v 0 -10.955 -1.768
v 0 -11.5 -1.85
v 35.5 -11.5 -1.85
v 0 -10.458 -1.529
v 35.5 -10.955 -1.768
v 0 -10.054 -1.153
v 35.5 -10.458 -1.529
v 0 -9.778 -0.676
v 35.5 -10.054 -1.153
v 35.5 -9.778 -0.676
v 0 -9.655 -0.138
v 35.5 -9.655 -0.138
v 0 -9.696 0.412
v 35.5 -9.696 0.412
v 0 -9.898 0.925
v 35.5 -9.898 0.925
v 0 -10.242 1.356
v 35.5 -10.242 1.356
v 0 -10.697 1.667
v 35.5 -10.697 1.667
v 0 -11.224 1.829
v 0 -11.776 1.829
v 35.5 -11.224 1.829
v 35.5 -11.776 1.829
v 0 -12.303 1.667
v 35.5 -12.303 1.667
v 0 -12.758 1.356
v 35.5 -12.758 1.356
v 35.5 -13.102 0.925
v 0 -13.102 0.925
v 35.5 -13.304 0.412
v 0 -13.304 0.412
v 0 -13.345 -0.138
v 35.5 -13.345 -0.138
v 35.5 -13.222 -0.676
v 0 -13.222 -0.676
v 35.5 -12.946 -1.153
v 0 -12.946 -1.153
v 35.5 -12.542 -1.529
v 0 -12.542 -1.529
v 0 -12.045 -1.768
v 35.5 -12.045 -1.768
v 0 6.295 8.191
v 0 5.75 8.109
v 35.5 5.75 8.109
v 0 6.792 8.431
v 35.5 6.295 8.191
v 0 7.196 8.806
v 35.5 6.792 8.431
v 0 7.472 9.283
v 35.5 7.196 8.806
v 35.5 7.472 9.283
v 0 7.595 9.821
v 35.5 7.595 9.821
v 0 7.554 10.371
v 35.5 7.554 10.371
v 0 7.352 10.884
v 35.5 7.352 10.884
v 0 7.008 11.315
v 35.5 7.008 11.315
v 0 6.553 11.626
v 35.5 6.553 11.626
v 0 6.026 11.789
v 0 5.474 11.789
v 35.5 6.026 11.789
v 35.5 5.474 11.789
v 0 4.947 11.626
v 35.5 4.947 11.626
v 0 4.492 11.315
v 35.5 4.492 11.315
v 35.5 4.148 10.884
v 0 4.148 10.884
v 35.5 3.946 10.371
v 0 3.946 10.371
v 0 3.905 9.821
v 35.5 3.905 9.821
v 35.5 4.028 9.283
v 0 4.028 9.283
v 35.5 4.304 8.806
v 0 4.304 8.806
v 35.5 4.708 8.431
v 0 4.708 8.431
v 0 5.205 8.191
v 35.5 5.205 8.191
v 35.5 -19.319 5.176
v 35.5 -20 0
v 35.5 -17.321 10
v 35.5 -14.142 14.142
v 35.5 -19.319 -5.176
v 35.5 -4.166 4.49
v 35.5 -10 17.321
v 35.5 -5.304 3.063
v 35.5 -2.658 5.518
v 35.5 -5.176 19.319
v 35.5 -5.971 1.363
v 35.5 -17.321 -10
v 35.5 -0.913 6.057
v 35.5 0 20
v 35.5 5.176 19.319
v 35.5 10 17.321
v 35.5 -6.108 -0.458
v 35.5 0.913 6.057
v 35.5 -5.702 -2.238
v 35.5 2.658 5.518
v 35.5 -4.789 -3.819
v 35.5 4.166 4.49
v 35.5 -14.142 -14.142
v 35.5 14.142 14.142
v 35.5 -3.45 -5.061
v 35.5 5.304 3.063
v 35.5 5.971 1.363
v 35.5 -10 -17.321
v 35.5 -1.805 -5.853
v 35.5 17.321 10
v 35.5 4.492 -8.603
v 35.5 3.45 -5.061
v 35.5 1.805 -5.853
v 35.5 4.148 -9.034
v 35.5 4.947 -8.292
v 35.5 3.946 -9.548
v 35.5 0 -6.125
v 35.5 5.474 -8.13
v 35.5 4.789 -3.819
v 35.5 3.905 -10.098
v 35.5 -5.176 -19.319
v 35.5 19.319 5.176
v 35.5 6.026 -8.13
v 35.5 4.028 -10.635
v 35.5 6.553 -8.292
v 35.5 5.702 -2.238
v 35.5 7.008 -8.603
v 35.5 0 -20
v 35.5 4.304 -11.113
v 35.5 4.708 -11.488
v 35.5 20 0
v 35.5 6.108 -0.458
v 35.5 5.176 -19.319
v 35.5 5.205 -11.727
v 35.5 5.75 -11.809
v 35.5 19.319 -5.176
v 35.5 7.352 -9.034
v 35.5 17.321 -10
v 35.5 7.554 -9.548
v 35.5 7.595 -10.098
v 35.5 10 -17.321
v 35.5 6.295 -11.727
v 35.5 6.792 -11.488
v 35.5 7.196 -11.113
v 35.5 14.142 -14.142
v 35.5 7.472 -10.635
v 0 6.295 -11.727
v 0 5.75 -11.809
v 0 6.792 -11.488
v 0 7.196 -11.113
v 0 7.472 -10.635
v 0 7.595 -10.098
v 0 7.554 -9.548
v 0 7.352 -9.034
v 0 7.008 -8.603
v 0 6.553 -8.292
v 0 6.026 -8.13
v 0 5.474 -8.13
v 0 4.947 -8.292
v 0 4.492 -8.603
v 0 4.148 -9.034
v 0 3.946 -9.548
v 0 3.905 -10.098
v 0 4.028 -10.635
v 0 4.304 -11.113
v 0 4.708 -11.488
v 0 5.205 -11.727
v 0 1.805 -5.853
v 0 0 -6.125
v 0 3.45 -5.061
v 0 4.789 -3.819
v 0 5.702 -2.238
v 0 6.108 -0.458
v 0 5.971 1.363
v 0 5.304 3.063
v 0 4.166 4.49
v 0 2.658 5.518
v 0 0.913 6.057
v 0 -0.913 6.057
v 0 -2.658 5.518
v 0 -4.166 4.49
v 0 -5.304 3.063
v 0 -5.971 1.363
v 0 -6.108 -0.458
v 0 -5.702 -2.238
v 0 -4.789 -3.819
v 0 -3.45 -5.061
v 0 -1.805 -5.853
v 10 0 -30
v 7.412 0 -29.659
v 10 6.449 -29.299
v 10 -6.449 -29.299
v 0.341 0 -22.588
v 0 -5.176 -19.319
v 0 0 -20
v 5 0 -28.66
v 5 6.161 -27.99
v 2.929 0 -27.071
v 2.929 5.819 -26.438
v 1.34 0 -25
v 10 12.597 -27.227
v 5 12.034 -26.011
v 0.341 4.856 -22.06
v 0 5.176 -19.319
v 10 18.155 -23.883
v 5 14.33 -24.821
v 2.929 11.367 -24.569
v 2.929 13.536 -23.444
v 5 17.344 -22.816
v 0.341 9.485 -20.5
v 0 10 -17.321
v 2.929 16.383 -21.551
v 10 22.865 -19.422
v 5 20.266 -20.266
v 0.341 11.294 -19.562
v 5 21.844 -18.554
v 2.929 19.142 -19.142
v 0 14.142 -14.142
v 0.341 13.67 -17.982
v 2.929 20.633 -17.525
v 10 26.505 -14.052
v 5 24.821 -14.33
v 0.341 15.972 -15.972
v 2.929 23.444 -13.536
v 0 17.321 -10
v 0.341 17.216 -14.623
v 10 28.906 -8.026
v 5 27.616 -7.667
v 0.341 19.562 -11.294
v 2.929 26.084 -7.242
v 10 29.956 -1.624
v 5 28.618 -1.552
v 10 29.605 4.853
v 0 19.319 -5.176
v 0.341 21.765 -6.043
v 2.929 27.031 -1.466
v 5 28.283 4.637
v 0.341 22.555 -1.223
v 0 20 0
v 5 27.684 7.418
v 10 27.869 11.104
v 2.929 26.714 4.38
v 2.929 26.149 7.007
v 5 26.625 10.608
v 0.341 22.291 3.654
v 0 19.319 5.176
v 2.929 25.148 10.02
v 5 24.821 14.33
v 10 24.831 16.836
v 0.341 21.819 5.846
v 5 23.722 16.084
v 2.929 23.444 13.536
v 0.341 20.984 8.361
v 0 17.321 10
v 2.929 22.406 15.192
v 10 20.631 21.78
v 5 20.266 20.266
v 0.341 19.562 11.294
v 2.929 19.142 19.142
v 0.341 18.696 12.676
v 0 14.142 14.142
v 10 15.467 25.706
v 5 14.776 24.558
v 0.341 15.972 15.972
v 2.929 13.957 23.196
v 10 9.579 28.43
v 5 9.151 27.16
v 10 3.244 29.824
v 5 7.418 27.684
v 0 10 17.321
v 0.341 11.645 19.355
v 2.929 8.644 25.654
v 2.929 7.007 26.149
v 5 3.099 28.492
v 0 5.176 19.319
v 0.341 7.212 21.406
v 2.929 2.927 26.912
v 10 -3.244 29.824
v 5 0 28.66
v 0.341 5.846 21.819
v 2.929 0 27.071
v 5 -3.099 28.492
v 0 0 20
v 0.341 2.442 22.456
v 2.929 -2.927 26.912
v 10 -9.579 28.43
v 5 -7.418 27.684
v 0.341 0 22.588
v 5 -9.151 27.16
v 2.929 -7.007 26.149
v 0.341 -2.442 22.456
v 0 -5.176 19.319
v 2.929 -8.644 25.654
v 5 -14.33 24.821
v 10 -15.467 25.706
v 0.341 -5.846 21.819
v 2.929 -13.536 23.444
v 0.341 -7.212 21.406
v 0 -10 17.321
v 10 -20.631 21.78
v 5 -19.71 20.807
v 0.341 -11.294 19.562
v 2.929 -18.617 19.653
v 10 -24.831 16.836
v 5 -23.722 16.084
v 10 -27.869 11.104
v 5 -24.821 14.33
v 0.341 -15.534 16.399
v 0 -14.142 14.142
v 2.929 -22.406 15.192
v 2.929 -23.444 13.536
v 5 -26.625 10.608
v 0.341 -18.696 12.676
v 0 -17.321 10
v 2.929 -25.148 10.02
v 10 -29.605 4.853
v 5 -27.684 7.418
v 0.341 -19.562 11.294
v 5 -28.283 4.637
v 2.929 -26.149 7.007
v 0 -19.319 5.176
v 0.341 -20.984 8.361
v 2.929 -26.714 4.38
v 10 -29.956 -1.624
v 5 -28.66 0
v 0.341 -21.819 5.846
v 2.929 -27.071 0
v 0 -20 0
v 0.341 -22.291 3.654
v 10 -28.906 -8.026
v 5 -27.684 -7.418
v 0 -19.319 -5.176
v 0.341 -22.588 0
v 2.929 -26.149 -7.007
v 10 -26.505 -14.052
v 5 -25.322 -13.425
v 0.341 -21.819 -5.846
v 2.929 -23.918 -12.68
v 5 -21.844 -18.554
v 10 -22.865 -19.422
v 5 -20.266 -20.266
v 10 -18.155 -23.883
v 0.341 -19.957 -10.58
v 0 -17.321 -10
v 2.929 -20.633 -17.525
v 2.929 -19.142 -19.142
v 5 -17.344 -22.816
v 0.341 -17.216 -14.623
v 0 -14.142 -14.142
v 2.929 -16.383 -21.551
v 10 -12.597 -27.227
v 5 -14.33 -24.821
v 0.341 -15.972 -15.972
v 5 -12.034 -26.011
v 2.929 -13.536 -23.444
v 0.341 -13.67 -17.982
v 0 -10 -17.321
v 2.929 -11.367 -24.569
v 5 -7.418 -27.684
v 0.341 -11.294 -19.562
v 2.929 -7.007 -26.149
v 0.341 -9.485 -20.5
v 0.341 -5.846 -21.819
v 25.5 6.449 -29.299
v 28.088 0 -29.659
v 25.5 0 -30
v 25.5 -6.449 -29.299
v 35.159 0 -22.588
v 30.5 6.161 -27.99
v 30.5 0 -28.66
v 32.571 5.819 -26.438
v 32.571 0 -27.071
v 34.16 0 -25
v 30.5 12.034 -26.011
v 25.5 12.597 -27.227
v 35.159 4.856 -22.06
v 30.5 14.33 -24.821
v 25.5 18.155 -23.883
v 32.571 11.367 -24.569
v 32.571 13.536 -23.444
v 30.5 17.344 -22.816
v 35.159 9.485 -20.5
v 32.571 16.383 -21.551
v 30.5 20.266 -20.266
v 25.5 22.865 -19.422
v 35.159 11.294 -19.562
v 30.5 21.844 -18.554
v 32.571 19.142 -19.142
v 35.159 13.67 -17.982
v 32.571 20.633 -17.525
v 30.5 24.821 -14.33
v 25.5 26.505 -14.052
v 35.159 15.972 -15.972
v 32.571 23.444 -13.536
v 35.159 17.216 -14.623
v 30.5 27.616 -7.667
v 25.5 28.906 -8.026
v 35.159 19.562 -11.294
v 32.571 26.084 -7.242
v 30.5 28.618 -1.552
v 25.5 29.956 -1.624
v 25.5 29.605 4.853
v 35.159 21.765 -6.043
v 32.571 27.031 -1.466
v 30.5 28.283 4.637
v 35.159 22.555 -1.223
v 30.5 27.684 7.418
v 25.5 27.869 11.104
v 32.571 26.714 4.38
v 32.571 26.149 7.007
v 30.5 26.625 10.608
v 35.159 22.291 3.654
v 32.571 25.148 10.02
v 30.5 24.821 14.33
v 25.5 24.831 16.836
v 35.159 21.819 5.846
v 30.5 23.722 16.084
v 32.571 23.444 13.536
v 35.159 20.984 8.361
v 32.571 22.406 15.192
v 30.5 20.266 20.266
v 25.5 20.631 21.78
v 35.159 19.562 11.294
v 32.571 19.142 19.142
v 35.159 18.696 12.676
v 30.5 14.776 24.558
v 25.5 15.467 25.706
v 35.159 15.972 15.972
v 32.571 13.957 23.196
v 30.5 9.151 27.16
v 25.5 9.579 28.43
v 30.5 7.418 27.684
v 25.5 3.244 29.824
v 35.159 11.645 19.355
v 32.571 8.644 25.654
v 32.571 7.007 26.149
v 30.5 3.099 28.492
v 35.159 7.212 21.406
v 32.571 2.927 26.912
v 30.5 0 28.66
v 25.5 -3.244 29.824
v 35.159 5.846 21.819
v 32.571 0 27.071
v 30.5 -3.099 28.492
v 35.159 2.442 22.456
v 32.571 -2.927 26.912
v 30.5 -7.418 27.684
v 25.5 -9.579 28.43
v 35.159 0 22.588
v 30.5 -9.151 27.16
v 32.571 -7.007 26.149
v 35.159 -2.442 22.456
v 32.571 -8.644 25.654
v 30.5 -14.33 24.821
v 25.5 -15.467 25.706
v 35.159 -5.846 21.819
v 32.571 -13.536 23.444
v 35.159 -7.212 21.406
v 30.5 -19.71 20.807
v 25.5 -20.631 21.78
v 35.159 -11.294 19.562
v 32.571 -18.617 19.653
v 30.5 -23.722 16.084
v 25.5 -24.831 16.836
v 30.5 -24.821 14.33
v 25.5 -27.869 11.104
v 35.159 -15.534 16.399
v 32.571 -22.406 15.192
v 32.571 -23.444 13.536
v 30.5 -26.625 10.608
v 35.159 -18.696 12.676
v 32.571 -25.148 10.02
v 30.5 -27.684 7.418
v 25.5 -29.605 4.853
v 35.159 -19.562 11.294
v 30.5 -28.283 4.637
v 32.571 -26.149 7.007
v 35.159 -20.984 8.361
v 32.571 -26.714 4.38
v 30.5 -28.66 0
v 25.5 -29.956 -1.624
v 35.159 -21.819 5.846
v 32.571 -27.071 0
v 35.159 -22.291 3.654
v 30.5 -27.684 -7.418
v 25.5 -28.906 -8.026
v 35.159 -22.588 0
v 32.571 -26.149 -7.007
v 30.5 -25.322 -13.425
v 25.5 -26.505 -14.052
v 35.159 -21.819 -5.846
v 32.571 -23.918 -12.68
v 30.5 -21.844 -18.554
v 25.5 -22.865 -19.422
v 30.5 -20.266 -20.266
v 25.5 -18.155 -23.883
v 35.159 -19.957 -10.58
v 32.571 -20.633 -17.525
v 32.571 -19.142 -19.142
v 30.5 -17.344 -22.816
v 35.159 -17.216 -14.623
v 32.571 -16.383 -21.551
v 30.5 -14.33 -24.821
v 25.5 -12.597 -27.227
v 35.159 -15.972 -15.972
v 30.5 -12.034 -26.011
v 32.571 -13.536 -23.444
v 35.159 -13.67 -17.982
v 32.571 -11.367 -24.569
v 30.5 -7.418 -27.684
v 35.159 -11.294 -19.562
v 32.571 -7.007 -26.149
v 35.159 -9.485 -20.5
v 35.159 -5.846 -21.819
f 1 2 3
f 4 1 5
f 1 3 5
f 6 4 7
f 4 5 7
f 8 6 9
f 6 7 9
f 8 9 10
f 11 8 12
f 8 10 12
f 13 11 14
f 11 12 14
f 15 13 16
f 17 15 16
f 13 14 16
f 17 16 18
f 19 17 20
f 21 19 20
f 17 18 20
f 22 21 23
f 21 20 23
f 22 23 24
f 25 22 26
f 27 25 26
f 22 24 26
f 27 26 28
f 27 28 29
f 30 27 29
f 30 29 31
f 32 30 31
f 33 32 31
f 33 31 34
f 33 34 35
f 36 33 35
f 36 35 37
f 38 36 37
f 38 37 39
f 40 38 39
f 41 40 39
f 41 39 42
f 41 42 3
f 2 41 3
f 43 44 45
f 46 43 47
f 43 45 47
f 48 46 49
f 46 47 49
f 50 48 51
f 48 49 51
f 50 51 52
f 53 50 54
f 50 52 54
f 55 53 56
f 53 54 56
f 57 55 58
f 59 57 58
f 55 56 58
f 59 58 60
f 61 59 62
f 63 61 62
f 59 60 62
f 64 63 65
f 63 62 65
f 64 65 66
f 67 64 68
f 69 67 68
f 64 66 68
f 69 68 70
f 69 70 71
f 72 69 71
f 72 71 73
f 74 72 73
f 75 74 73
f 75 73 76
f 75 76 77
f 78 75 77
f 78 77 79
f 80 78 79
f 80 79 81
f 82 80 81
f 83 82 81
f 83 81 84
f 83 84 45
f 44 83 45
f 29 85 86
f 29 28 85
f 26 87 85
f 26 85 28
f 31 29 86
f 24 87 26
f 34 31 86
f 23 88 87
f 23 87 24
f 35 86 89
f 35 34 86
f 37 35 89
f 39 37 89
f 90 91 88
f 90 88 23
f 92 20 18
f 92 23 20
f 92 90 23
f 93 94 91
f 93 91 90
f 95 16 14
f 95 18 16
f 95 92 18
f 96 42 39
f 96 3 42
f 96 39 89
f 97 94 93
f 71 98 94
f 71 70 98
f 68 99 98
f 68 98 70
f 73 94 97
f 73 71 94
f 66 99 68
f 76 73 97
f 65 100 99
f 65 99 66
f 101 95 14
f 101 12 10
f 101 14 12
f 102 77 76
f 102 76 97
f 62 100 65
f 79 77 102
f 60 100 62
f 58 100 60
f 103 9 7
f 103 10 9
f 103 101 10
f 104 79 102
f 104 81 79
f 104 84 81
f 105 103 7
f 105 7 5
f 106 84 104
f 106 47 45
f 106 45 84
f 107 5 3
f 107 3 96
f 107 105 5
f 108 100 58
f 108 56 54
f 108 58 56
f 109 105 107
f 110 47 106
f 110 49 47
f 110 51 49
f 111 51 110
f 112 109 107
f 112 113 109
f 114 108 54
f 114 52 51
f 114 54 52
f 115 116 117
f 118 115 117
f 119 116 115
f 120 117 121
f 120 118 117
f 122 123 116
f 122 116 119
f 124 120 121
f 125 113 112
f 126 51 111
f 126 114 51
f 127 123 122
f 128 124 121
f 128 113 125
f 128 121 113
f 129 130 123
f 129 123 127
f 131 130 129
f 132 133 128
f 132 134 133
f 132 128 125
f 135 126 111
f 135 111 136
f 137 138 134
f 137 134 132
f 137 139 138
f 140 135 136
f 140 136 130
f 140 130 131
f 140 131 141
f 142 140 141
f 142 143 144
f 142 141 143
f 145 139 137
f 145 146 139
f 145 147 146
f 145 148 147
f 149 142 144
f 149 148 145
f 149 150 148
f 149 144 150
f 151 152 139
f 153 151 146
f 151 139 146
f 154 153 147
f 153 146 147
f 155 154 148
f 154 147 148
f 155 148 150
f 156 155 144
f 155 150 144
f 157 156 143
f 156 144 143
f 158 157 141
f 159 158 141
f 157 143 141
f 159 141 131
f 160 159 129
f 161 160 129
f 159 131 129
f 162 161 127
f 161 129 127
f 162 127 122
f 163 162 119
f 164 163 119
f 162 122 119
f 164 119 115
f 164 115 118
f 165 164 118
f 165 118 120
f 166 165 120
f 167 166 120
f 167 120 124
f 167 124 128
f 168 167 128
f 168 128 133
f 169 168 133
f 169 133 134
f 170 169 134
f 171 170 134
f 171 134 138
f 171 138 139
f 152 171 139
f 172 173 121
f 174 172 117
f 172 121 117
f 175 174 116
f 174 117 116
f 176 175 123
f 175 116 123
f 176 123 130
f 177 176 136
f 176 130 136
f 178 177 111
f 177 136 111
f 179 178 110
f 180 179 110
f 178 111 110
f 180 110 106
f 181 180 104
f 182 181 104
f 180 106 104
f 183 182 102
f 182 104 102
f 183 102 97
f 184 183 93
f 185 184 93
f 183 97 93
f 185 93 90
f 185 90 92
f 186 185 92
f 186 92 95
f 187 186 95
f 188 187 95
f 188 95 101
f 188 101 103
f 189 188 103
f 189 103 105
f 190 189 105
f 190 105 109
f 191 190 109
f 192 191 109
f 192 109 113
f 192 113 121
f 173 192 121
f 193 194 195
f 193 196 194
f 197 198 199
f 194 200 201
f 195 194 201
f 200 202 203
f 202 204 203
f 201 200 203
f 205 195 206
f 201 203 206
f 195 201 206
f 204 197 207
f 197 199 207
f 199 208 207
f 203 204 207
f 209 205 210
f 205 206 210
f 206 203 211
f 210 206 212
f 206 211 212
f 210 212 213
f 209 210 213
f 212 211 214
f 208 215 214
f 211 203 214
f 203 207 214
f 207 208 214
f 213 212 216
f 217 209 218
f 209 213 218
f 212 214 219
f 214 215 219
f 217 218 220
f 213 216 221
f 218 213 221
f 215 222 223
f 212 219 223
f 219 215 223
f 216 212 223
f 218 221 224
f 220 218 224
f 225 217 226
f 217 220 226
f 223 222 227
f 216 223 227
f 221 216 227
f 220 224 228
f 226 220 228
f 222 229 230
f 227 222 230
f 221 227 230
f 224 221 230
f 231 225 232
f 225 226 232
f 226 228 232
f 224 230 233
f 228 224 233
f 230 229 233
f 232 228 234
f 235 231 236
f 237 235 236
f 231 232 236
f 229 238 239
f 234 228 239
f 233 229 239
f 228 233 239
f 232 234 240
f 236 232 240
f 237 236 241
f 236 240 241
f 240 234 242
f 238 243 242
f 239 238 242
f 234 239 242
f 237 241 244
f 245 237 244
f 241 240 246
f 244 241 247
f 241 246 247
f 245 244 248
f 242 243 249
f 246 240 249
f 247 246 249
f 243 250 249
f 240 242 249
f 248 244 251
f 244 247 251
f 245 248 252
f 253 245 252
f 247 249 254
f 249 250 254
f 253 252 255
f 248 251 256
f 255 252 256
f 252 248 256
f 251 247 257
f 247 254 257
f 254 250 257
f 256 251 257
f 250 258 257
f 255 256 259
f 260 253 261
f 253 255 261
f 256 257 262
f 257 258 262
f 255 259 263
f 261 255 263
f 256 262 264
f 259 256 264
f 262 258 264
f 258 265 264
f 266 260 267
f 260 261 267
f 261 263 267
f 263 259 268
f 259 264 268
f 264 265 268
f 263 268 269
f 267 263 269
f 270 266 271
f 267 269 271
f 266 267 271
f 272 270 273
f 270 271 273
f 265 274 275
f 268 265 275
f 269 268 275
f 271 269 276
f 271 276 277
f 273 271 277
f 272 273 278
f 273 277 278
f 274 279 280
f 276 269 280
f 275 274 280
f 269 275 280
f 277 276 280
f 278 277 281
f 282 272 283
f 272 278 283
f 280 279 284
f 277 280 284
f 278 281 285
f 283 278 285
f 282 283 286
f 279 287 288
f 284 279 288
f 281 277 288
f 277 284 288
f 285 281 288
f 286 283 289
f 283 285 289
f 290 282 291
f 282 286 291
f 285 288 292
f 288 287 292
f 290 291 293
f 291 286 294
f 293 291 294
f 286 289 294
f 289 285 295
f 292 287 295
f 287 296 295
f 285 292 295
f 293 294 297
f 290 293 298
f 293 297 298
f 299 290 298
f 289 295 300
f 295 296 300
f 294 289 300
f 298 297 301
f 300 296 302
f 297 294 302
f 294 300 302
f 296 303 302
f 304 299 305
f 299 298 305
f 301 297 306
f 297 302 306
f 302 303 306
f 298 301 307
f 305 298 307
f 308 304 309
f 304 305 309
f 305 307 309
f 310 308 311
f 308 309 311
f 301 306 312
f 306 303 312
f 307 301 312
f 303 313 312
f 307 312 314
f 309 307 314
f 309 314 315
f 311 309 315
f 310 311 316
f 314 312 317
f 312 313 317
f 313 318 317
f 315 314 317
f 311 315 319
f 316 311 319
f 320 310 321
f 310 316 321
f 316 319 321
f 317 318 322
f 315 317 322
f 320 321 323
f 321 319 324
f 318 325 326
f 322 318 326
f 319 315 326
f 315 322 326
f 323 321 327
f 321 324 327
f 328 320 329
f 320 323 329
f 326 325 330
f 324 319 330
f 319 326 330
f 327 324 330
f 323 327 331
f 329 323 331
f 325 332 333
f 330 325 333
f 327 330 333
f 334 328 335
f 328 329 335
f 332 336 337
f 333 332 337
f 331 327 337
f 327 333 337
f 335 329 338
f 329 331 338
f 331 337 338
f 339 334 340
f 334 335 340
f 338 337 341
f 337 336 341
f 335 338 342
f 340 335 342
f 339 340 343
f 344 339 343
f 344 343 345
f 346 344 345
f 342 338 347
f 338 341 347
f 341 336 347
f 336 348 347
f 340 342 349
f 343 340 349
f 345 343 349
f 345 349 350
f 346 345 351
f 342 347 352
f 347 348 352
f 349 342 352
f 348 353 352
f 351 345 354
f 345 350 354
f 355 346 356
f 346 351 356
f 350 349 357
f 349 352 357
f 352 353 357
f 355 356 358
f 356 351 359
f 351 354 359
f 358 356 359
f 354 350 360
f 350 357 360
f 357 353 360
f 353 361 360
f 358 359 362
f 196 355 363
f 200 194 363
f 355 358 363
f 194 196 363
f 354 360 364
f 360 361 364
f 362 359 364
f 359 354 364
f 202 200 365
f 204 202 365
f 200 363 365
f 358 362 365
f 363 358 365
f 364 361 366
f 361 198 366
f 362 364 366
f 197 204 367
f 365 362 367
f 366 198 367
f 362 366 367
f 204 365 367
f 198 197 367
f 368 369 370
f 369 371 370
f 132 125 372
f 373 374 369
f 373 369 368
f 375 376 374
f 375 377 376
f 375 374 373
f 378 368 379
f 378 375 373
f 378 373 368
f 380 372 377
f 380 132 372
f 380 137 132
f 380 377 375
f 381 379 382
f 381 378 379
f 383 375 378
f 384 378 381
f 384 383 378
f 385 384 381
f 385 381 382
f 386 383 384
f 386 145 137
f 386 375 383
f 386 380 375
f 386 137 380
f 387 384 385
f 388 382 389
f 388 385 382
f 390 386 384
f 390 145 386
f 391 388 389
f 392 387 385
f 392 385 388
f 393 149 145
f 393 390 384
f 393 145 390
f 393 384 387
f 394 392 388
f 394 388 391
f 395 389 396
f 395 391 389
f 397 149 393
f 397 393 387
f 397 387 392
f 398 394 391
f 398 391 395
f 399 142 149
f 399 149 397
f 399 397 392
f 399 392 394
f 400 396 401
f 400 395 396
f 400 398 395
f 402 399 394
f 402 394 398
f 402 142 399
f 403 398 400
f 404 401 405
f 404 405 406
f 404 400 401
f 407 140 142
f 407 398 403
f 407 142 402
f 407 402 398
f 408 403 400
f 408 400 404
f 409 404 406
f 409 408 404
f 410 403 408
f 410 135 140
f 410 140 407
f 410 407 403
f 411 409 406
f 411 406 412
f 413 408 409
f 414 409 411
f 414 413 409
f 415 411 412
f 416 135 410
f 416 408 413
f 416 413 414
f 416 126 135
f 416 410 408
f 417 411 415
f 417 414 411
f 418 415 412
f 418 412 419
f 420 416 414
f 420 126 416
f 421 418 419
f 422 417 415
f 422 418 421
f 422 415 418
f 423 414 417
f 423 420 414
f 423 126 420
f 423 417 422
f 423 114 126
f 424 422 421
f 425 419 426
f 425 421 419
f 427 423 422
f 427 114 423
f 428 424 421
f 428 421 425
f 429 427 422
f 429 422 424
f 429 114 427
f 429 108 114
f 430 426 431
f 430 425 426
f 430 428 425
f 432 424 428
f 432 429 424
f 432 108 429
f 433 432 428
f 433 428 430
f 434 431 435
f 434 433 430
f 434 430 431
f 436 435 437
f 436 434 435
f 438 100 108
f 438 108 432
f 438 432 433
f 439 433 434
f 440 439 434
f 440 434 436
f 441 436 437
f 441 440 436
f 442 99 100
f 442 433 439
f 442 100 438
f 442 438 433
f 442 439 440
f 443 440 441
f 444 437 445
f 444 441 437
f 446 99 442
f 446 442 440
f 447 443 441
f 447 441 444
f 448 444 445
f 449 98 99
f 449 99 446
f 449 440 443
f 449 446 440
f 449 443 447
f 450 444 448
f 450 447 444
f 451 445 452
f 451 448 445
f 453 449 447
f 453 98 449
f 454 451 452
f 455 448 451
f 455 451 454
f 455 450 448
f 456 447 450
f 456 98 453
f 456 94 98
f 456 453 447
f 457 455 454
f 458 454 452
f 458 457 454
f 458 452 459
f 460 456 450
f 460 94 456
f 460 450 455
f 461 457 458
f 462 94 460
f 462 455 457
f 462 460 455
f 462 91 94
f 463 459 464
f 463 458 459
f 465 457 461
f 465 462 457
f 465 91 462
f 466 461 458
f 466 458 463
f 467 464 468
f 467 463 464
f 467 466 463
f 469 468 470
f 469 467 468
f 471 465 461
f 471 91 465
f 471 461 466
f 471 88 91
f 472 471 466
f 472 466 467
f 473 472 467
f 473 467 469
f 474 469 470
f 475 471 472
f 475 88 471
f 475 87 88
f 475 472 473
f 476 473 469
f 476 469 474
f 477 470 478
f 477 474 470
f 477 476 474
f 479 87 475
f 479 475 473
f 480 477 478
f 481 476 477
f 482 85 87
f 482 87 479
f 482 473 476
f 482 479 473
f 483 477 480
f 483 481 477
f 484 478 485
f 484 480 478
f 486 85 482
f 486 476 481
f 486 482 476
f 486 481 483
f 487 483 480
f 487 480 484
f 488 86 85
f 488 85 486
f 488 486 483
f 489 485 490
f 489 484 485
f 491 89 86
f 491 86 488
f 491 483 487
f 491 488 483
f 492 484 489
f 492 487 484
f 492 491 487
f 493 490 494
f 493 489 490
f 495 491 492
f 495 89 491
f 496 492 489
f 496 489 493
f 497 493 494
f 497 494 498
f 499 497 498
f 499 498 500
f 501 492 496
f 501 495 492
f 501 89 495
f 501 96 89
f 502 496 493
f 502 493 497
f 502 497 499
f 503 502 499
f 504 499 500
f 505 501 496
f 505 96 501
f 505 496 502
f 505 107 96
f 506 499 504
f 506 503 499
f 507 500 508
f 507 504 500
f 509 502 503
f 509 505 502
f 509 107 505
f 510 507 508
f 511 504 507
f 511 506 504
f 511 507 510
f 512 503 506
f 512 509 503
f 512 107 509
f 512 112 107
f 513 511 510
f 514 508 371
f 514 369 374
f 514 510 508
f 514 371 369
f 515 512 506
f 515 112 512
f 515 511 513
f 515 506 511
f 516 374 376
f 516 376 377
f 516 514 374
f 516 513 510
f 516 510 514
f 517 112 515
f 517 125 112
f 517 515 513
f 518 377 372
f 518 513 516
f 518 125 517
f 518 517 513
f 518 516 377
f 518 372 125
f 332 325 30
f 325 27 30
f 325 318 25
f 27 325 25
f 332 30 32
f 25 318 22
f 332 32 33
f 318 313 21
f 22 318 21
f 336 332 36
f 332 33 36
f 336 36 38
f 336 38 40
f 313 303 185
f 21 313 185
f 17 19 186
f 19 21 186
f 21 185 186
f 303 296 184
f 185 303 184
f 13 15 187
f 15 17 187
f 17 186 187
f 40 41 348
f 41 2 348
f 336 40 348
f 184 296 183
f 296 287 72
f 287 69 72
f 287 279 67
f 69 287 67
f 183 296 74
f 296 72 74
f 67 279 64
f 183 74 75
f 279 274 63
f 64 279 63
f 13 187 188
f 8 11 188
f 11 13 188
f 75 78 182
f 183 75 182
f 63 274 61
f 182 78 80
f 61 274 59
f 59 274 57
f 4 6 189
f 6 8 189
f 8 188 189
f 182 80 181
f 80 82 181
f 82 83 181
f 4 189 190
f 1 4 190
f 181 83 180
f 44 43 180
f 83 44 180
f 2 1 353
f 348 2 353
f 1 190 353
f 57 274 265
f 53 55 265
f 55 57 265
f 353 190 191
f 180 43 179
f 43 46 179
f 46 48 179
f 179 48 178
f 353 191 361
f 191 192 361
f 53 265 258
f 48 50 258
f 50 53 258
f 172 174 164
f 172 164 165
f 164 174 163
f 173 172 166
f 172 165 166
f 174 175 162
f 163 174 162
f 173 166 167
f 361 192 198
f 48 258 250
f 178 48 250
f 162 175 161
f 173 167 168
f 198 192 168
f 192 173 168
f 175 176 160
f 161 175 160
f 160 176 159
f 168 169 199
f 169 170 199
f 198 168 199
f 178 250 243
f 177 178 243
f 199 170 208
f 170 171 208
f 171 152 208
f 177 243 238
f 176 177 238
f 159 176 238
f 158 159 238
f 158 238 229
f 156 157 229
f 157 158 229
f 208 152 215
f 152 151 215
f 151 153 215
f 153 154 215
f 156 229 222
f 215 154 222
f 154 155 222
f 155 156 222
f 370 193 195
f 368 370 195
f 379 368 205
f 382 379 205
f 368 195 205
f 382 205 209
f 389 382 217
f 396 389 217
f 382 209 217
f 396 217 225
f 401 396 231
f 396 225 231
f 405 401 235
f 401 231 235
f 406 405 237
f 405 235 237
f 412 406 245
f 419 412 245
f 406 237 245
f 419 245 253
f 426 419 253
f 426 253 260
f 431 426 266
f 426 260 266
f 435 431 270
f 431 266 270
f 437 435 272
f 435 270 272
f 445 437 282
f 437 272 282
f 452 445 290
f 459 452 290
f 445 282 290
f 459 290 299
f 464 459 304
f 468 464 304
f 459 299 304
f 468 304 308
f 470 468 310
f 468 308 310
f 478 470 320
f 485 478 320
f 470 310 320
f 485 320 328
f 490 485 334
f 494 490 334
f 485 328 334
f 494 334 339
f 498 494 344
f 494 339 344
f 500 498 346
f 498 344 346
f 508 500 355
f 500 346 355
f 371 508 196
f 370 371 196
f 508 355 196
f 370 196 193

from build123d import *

# Parameters (mm, degrees)
SKETCH1_R           = 30
BOSS_EXTRUDE1_DEPTH = 35.5
SKETCH2_R           = 6.125
SKETCH2_R_2         = 1.85
CUT_EXTRUDE1_DEPTH  = 56.31952639
FILLET1_R           = 10


with BuildPart() as part:
    # Sketch1 → Boss-Extrude1 (new body)
    with BuildSketch(Plane(origin=(0, 0, 0), x_dir=(0, 0, -1), z_dir=(1, 0, 0))):
        Circle(SKETCH1_R)
    extrude(amount=BOSS_EXTRUDE1_DEPTH)

    # Sketch2 → Cut-Extrude1 (cut, through all)
    with BuildSketch(Plane(origin=(35.5, 0, 0), x_dir=(0, 0, -1), z_dir=(1, 0, 0))):
        Circle(SKETCH2_R)
        with Locations((-9.959292144, 5.75)):
            Circle(SKETCH2_R_2)
        with Locations((9.959292144, 5.75)):
            Circle(SKETCH2_R_2)
        with Locations((0, -11.5)):
            Circle(SKETCH2_R_2)
    extrude(amount=-CUT_EXTRUDE1_DEPTH, mode=Mode.SUBTRACT)

    # Fillet1
    fillet1_edges = [part.edges().sort_by_distance(p)[0] for p in [
        (0, 0, 30),
        (35.5, 0, 30),
    ]]
    fillet(fillet1_edges, radius=FILLET1_R)


solid = part.part
